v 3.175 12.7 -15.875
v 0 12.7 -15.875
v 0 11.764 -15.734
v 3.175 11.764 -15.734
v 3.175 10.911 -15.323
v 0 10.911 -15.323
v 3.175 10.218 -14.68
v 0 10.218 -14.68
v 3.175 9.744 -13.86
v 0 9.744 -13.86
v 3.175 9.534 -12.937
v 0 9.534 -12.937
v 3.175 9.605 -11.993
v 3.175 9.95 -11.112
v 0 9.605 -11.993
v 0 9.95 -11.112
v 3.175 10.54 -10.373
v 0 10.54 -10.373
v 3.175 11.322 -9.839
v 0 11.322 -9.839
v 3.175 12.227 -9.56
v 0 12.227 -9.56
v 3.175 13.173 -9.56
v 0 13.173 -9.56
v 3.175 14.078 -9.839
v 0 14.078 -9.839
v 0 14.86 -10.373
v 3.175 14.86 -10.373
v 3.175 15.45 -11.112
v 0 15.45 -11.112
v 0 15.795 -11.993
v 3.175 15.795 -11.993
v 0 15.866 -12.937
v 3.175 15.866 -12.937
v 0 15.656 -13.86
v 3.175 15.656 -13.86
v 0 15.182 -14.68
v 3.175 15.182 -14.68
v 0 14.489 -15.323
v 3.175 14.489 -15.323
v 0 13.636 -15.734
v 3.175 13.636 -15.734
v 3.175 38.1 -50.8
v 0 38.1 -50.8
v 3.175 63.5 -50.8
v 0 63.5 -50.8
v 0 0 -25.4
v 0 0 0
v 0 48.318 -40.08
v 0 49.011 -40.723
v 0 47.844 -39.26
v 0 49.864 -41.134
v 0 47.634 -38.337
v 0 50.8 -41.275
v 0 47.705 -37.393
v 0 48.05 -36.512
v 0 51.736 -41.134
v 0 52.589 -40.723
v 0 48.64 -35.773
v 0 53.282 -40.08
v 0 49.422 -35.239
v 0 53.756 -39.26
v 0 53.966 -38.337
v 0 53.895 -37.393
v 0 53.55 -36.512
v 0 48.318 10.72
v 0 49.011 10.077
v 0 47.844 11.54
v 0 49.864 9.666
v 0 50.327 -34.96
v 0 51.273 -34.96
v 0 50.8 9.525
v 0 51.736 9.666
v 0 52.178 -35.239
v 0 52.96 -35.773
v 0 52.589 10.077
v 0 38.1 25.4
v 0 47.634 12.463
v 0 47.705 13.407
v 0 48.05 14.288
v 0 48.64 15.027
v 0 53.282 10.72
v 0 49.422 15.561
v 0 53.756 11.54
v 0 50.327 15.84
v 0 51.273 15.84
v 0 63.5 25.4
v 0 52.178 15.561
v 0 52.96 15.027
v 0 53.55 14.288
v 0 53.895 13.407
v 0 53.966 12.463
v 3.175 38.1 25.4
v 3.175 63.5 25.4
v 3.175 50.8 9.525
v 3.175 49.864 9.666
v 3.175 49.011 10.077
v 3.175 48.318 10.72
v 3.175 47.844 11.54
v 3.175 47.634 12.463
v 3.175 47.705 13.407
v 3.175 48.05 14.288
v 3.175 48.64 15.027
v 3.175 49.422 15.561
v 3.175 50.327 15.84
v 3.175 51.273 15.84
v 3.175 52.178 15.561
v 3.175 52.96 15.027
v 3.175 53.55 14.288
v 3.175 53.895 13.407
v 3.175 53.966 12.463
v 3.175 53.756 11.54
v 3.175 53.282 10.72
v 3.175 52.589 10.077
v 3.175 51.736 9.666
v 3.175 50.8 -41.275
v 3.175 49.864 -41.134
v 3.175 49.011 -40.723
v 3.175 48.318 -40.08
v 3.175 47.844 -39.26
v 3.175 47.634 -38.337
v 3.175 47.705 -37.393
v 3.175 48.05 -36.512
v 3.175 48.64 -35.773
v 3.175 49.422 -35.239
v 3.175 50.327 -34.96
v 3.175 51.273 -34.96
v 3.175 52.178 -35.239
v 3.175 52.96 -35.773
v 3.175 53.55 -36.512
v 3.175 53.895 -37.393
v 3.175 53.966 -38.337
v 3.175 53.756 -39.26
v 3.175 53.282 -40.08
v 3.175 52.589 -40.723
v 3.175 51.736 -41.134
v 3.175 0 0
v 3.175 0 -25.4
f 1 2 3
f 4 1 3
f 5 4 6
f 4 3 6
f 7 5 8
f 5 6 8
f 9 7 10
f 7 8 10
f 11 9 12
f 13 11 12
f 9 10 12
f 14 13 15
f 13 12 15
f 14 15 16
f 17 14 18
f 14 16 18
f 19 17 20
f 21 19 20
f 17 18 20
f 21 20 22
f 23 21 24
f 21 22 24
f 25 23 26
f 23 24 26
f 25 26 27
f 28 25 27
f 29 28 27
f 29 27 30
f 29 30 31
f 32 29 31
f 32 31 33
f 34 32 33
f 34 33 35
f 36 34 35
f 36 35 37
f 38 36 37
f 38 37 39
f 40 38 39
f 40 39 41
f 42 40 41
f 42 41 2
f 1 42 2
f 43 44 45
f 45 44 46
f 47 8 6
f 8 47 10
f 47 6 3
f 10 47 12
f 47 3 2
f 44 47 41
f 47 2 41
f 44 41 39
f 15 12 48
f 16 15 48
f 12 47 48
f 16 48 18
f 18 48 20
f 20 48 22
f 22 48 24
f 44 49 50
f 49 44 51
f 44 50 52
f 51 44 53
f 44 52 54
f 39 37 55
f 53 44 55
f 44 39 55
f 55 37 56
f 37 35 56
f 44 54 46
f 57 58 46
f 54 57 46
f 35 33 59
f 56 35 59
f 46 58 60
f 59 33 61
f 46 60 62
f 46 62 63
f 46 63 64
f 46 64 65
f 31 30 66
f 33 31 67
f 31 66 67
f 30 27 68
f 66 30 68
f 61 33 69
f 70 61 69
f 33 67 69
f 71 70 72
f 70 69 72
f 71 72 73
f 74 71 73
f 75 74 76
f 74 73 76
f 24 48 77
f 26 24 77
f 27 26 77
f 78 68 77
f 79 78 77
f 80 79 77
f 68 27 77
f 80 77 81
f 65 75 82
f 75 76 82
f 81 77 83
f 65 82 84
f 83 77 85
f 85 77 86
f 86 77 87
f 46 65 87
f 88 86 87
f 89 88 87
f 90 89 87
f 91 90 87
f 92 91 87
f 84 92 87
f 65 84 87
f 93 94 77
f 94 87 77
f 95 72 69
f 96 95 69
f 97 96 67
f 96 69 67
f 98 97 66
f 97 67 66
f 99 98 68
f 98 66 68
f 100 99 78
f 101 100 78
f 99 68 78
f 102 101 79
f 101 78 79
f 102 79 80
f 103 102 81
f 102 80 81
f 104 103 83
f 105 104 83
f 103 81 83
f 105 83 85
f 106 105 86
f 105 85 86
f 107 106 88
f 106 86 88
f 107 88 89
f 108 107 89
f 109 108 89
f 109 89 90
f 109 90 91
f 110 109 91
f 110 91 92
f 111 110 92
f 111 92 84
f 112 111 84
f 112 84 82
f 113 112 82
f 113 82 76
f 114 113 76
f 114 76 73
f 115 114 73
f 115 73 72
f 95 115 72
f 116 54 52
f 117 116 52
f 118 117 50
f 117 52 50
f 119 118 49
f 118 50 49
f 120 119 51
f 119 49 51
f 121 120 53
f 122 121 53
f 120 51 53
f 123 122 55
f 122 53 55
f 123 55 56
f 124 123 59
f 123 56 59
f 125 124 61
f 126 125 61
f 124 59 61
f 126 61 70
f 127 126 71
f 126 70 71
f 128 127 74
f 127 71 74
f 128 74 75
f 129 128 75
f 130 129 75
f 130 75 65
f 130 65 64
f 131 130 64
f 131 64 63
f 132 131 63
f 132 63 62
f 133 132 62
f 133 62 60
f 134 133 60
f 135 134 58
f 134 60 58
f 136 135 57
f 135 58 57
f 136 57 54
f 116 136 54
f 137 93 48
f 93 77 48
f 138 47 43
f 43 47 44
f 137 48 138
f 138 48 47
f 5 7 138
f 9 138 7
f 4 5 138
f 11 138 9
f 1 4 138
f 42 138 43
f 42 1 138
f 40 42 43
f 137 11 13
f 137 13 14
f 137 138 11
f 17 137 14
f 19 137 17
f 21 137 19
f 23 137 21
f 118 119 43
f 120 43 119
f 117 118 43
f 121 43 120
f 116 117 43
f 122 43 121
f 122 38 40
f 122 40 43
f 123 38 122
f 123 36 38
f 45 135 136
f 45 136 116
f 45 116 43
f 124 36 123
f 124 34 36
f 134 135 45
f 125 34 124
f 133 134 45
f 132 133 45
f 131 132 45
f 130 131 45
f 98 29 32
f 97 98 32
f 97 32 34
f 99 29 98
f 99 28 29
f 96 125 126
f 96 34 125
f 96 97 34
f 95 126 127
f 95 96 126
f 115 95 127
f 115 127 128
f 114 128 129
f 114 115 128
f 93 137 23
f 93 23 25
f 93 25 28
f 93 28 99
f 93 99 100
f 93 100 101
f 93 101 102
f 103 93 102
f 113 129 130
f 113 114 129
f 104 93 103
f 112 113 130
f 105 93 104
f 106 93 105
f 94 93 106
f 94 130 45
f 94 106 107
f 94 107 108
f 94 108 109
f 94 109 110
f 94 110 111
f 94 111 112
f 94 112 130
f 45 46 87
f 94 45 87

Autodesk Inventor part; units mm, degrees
ref_plane "YZ Plane" through (0, 0, 0) normal (1, 0, 0) x (0, 1, 0)
ref_plane "XZ Plane" through (0, 0, 0) normal (0, 1, 0) x (-1, 0, 0)
ref_plane "XY Plane" through (0, 0, 0) normal (0, 0, 1) x (1, 0, 0)
sketch "Sketch1" plane through (0, 0, 0) normal (1, 0, 0) x (0, 1, 0)
  line L0 (0, 0) -> (0, -25.4)
  line L1 (0, -25.4) -> (38.1, -50.8)
  line L2 (38.1, -50.8) -> (63.5, -50.8)
  line L3 (63.5, -50.8) -> (63.5, 25.4)
  line L4 (63.5, 25.4) -> (38.1, 25.4)
  line L5 (38.1, 25.4) -> (0, 0)
  dimension "d0" = 76.2
  dimension "d2" = 25.4
  dimension "d3" = 25.4
  dimension "d4" = 25.4
  dimension "d5" = 63.5
  dimension "d6" = 25.4
extrude "Extrusion1" add sketch "Sketch1" along normal blind 3.175
sketch "Sketch2" plane through (3.175, 0, 0) normal (1, 0, 0) x (0, 0, -1)
  line L0 (0, 0) -> (25.4, 0) projected
  line L1 (50.8, 38.1) -> (50.8, 63.5) projected
  line L2 (50.8, 63.5) -> (-25.4, 63.5) projected
  line L3 (-25.4, 63.5) -> (-25.4, 38.1) projected
  point P0 (-12.7, 50.8)
  point P1 (38.1, 50.8)
  point P2 (12.7, 12.7)
  dimension "d9" = 12.7
  dimension "d10" = 12.7
  dimension "d11" = 12.7
  dimension "d12" = 12.7
  dimension "d13" = 12.7
  dimension "d14" = 12.7
hole "Hole1" at (3.175, 50.8, 12.7) at (3.175, 50.8, -38.1) at (3.175, 12.7, -12.7) direction (-1, 0, 0) diameter 6.35 end through all
properties part number "Mounting" material "Aluminum 6061"
